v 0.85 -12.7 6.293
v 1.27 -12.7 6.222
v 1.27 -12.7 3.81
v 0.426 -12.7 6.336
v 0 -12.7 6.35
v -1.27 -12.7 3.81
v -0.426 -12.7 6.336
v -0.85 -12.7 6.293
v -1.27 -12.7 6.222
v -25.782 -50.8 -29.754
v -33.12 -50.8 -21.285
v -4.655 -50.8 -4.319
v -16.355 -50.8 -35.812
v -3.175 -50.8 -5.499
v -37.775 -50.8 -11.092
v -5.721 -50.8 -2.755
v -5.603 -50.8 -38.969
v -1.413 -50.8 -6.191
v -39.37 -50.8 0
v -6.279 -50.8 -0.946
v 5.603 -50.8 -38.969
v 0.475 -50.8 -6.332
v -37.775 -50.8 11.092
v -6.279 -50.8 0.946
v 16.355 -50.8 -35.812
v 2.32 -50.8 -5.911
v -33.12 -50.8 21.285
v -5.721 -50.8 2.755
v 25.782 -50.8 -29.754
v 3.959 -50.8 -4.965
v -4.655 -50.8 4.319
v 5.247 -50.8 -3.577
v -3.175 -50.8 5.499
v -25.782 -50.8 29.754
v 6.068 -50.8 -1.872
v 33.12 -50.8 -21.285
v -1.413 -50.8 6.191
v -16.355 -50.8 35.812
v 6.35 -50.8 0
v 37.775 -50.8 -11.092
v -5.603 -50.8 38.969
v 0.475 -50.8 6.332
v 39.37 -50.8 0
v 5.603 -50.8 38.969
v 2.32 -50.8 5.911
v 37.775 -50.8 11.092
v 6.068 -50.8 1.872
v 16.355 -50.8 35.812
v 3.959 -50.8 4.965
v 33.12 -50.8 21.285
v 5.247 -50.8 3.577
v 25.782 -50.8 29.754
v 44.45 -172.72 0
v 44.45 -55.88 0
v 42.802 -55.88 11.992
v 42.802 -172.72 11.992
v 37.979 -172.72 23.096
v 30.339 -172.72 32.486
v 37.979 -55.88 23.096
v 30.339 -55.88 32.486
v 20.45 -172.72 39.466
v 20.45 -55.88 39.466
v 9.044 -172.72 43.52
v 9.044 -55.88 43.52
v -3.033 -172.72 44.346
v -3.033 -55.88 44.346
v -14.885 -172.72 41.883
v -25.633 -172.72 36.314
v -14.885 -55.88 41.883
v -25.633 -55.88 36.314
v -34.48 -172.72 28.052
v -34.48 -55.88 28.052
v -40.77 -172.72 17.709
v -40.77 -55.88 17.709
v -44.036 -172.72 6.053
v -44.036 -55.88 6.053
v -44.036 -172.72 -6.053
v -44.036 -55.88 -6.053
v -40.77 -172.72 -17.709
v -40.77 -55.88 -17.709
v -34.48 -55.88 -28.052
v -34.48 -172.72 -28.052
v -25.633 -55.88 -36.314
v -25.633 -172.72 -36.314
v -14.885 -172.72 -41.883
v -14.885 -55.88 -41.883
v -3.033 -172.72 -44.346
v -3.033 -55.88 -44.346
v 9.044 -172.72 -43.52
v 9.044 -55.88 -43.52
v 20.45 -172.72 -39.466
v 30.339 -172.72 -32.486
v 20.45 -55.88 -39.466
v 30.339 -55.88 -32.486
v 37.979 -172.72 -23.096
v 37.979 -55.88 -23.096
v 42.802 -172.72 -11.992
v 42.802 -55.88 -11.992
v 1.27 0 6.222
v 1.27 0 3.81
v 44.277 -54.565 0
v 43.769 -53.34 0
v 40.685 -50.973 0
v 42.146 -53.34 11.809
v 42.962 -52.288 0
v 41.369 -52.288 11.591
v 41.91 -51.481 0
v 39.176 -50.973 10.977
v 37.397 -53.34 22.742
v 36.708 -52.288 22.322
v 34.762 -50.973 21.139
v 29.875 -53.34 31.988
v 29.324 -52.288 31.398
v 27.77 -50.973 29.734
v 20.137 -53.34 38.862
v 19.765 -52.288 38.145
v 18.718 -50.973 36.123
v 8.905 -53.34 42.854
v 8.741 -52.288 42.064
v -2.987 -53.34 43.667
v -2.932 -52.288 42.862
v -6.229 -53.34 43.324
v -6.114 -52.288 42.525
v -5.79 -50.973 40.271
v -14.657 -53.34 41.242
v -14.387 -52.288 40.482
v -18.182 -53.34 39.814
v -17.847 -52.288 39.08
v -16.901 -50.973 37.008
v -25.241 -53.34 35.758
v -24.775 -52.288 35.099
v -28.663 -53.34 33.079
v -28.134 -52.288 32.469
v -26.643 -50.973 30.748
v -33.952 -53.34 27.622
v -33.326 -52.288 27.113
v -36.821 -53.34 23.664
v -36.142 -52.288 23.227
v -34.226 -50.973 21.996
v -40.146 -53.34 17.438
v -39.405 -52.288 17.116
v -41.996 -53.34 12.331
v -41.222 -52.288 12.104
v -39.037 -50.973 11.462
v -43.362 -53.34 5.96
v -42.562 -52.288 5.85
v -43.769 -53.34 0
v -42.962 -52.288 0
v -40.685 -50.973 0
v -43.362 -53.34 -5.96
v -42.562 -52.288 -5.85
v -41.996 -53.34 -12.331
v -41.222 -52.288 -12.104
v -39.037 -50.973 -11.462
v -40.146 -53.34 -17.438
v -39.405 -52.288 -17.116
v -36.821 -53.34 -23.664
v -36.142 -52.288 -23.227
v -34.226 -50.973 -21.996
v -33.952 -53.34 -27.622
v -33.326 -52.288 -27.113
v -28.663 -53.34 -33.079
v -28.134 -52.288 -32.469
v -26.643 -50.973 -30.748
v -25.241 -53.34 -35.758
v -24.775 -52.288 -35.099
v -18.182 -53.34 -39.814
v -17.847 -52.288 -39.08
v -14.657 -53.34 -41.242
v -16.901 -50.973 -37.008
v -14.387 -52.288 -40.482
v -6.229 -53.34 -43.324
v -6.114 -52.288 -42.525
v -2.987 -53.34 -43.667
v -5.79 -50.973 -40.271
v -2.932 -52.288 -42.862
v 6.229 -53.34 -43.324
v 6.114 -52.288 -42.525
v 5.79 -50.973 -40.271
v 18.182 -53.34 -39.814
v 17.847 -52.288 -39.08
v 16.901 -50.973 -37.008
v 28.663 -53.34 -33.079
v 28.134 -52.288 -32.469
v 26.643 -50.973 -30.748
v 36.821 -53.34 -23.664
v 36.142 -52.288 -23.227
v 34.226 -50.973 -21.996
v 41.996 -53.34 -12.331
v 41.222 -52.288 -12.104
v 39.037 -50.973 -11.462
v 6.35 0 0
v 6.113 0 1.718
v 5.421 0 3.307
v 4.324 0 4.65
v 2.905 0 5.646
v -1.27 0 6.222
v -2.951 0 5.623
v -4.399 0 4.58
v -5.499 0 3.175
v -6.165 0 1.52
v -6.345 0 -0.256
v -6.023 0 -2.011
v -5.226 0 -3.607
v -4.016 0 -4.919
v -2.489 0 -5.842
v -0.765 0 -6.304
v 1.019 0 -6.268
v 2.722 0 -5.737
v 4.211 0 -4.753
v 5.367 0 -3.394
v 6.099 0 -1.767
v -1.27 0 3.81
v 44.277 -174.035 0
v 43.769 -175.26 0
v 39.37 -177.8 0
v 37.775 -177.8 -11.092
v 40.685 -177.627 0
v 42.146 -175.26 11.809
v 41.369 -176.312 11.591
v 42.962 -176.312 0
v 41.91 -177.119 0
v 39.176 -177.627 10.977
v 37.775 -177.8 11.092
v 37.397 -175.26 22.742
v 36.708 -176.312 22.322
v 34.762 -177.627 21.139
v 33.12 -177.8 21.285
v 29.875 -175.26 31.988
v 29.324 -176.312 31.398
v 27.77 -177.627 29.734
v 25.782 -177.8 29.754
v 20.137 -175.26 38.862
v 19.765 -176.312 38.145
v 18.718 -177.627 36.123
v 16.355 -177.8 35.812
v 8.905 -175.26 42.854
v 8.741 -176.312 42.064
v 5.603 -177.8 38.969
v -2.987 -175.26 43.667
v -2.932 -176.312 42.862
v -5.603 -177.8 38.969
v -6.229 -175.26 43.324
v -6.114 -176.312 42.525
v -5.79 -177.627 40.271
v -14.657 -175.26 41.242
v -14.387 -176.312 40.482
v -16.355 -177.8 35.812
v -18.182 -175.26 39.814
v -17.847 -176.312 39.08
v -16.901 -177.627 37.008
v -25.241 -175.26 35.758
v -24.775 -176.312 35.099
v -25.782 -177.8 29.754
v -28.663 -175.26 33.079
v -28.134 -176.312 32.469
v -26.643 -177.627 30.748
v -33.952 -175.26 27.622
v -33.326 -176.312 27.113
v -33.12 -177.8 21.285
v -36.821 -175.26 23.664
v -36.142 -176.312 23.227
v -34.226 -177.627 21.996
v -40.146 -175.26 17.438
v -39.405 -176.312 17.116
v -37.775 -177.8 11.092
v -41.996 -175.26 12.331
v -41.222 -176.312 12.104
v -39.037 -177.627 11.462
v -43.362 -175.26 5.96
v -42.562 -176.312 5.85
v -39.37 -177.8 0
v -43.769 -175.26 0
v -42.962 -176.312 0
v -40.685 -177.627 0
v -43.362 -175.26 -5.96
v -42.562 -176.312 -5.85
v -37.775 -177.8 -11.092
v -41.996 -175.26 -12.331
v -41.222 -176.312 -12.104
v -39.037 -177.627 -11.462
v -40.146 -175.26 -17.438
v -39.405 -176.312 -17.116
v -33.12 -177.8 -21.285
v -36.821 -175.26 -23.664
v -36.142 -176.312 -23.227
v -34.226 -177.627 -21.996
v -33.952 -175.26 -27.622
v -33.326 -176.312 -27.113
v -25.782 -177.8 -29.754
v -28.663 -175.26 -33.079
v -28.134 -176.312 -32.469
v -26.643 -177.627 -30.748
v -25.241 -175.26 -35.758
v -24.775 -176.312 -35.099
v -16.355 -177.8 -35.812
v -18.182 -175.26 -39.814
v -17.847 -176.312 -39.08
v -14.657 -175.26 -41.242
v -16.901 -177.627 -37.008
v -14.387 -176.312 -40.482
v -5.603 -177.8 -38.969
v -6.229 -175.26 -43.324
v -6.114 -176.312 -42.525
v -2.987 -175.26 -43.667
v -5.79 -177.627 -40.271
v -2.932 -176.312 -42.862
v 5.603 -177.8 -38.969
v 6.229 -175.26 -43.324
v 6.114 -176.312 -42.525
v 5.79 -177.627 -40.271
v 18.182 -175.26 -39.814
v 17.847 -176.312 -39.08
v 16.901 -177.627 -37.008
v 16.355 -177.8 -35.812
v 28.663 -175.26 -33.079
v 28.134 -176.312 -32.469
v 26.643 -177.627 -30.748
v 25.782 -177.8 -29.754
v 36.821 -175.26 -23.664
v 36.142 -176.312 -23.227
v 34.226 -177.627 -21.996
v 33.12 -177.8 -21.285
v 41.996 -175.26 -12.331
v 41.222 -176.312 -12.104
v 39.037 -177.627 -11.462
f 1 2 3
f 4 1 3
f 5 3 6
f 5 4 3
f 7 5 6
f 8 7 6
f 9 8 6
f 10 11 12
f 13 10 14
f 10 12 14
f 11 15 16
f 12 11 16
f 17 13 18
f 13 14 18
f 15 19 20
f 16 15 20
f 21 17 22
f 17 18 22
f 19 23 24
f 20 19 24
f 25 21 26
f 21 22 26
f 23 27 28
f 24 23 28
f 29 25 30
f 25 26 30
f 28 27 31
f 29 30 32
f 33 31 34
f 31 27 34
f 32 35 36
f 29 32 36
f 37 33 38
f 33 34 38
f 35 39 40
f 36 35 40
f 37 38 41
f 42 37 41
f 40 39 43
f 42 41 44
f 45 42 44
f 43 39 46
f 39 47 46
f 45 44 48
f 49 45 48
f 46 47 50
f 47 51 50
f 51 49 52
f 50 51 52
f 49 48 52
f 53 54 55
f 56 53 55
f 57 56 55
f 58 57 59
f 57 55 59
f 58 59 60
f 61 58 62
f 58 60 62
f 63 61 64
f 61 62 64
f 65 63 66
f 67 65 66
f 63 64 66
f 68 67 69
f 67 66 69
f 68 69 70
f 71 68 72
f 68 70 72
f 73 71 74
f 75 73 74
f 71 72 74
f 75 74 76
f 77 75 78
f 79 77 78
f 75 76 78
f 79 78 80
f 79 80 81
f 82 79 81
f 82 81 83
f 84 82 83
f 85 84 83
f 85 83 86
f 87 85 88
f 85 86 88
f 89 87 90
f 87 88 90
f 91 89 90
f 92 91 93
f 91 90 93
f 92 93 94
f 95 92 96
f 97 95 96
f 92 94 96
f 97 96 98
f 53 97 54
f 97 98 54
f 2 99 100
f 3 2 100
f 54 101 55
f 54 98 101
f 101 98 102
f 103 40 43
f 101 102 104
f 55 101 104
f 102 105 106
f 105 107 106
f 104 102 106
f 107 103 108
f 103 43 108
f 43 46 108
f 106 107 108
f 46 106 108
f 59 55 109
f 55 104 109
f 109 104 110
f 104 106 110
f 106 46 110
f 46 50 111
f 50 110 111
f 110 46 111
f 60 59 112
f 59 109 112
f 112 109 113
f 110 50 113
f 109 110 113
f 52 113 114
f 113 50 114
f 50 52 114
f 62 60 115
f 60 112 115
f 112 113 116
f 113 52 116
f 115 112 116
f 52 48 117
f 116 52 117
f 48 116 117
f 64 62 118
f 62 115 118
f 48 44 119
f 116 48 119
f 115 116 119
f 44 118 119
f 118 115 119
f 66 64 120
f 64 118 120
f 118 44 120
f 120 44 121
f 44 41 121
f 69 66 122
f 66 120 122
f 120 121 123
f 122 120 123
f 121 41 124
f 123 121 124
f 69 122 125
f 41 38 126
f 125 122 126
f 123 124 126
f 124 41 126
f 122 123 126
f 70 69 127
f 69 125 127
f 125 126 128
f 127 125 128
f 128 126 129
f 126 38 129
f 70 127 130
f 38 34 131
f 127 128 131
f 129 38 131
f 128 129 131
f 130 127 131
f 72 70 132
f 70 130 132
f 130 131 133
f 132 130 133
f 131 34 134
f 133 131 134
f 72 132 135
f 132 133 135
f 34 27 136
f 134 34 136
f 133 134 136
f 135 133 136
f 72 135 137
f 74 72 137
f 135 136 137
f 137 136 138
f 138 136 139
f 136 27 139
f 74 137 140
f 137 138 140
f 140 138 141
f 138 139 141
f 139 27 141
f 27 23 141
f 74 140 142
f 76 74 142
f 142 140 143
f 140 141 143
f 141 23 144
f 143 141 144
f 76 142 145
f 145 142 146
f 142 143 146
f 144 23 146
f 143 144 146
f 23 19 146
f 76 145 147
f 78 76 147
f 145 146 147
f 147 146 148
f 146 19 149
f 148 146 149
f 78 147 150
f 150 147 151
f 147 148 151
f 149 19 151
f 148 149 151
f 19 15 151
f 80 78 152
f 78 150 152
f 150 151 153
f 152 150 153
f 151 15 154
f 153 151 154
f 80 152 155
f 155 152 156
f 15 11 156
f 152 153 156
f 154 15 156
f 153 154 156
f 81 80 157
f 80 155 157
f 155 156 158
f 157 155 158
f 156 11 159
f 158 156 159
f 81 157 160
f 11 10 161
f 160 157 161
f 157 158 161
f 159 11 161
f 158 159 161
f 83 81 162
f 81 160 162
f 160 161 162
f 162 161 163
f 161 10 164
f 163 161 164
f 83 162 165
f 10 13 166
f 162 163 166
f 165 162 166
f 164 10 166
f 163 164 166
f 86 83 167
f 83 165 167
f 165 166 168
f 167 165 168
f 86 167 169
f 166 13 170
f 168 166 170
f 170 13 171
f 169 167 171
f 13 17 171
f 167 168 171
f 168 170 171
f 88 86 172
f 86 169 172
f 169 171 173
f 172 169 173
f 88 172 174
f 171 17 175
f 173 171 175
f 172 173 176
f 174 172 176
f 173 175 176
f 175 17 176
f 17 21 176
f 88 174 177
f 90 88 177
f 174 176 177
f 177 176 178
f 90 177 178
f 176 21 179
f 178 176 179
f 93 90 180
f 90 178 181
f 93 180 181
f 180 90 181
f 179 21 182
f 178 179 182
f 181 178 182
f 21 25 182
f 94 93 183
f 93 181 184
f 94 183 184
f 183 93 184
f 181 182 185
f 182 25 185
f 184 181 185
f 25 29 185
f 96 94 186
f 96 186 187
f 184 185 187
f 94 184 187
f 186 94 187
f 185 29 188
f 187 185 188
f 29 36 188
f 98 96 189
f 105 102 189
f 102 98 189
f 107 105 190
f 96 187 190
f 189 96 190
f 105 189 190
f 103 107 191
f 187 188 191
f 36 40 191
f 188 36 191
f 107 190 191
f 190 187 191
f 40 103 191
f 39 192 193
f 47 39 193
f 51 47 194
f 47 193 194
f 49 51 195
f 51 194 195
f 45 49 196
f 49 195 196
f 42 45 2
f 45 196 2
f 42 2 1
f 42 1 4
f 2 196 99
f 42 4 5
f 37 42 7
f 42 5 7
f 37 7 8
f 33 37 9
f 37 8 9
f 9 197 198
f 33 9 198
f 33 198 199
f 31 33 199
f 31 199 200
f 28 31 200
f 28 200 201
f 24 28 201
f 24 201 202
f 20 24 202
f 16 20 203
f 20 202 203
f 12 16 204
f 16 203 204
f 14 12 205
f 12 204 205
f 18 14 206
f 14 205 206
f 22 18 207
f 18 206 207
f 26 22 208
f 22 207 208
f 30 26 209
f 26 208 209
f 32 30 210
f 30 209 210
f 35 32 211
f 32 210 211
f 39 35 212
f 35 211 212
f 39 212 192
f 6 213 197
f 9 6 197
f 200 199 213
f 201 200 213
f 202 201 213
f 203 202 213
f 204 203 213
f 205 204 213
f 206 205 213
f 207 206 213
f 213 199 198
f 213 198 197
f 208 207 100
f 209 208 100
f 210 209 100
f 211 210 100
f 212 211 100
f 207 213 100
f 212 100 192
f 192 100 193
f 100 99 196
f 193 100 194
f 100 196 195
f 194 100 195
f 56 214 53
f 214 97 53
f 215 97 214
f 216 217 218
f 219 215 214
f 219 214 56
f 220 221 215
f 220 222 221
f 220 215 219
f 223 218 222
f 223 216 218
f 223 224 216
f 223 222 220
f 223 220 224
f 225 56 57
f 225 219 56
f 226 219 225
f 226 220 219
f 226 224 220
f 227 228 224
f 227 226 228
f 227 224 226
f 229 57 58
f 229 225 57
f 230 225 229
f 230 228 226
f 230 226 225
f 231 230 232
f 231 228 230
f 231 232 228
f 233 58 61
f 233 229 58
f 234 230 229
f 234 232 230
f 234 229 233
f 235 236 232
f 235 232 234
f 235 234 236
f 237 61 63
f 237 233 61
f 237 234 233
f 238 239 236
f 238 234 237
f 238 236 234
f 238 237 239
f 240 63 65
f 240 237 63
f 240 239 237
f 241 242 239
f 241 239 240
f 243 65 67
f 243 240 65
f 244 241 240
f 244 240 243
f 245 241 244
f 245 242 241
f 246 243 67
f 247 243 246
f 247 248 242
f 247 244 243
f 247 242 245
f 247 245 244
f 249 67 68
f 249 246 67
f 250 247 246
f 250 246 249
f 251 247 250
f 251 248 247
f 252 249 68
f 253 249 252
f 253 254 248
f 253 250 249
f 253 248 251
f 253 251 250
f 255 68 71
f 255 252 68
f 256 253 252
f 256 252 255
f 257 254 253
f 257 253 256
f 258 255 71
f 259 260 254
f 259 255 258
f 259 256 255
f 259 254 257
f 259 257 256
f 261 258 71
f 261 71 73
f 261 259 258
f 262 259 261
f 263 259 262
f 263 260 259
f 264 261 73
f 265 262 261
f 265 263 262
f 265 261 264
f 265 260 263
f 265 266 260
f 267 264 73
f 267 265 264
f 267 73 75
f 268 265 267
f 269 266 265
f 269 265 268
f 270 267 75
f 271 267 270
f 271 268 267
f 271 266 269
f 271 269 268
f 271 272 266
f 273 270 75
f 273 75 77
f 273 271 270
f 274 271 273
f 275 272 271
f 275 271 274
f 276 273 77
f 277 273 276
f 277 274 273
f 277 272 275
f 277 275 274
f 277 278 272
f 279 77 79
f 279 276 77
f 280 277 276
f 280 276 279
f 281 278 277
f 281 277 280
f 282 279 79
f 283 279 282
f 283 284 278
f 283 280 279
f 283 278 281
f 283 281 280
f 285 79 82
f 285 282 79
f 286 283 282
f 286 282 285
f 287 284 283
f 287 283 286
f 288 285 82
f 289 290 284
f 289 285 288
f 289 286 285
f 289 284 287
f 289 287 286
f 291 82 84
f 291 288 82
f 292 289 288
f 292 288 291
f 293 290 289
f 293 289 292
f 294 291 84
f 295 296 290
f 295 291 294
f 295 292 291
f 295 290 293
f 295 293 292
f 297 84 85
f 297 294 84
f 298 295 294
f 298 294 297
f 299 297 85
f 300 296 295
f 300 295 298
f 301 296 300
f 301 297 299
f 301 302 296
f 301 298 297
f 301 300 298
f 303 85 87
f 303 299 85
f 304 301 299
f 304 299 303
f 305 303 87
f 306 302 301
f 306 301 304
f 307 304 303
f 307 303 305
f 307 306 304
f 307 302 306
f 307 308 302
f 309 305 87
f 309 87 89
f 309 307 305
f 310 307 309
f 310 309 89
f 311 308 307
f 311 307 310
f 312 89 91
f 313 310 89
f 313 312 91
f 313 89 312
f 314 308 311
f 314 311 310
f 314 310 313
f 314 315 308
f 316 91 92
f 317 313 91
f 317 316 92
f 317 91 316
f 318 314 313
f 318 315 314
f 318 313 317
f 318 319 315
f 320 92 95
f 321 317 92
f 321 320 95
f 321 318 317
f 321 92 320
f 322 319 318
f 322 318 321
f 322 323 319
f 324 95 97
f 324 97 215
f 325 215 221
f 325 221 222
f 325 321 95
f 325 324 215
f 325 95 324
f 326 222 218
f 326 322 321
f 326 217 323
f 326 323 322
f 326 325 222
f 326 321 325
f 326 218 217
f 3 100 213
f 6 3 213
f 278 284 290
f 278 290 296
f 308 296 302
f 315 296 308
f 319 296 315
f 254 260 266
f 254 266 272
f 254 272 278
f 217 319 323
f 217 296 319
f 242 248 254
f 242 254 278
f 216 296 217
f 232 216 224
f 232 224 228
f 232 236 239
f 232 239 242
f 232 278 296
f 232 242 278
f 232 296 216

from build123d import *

# Parameters (mm, degrees)
F0_R     = 6.35
F1_DEPTH = 50.8
F2_R     = 44.45
F3_DEPTH = 127
F4_R     = 5.08
F5_R     = 5.08
F7_DEPTH = 12.7


with BuildPart() as f1:
    # F0 (on Front) → F1 (new body)
    with BuildSketch(Plane.XZ):
        Circle(F0_R)
    extrude(amount=F1_DEPTH)

    # F2 (on face) → F3 (join)
    with BuildSketch(Plane.XZ.offset(50.8)):
        Circle(F2_R)
    extrude(amount=F3_DEPTH)

    # F4
    f4_edges = [f1.edges().sort_by_distance(p)[0] for p in [
        (-44.45, -50.8, 0),
    ]]
    fillet(f4_edges, radius=F4_R)

    # F5
    f5_edges = [f1.edges().sort_by_distance(p)[0] for p in [
        (-44.45, -177.8, 0),
    ]]
    fillet(f5_edges, radius=F5_R)

    # F6 (on face) → F7 (cut)
    with BuildSketch(Plane(origin=(0, 0, 0), x_dir=(-1, 0, 0), z_dir=(0, 1, 0))):
        with BuildLine():
            ThreePointArc((0, 6.35), (-0.6382319087, 6.3178445716), (-1.27, 6.2217039467))
            Line((-1.27, 6.2217039467), (-1.27, 3.81))
            Line((-1.27, 3.81), (0, 3.81))
            Line((0, 3.81), (0, 6.35))
        make_face()
        with BuildLine():
            Line((1.27, 3.81), (1.27, 6.2217039467))
            ThreePointArc((1.27, 6.2217039467), (0.6382319087, 6.3178445716), (0, 6.35))
            Line((0, 6.35), (0, 3.81))
            Line((0, 3.81), (1.27, 3.81))
        make_face()
    extrude(amount=-F7_DEPTH, mode=Mode.SUBTRACT)


solid = f1.part
